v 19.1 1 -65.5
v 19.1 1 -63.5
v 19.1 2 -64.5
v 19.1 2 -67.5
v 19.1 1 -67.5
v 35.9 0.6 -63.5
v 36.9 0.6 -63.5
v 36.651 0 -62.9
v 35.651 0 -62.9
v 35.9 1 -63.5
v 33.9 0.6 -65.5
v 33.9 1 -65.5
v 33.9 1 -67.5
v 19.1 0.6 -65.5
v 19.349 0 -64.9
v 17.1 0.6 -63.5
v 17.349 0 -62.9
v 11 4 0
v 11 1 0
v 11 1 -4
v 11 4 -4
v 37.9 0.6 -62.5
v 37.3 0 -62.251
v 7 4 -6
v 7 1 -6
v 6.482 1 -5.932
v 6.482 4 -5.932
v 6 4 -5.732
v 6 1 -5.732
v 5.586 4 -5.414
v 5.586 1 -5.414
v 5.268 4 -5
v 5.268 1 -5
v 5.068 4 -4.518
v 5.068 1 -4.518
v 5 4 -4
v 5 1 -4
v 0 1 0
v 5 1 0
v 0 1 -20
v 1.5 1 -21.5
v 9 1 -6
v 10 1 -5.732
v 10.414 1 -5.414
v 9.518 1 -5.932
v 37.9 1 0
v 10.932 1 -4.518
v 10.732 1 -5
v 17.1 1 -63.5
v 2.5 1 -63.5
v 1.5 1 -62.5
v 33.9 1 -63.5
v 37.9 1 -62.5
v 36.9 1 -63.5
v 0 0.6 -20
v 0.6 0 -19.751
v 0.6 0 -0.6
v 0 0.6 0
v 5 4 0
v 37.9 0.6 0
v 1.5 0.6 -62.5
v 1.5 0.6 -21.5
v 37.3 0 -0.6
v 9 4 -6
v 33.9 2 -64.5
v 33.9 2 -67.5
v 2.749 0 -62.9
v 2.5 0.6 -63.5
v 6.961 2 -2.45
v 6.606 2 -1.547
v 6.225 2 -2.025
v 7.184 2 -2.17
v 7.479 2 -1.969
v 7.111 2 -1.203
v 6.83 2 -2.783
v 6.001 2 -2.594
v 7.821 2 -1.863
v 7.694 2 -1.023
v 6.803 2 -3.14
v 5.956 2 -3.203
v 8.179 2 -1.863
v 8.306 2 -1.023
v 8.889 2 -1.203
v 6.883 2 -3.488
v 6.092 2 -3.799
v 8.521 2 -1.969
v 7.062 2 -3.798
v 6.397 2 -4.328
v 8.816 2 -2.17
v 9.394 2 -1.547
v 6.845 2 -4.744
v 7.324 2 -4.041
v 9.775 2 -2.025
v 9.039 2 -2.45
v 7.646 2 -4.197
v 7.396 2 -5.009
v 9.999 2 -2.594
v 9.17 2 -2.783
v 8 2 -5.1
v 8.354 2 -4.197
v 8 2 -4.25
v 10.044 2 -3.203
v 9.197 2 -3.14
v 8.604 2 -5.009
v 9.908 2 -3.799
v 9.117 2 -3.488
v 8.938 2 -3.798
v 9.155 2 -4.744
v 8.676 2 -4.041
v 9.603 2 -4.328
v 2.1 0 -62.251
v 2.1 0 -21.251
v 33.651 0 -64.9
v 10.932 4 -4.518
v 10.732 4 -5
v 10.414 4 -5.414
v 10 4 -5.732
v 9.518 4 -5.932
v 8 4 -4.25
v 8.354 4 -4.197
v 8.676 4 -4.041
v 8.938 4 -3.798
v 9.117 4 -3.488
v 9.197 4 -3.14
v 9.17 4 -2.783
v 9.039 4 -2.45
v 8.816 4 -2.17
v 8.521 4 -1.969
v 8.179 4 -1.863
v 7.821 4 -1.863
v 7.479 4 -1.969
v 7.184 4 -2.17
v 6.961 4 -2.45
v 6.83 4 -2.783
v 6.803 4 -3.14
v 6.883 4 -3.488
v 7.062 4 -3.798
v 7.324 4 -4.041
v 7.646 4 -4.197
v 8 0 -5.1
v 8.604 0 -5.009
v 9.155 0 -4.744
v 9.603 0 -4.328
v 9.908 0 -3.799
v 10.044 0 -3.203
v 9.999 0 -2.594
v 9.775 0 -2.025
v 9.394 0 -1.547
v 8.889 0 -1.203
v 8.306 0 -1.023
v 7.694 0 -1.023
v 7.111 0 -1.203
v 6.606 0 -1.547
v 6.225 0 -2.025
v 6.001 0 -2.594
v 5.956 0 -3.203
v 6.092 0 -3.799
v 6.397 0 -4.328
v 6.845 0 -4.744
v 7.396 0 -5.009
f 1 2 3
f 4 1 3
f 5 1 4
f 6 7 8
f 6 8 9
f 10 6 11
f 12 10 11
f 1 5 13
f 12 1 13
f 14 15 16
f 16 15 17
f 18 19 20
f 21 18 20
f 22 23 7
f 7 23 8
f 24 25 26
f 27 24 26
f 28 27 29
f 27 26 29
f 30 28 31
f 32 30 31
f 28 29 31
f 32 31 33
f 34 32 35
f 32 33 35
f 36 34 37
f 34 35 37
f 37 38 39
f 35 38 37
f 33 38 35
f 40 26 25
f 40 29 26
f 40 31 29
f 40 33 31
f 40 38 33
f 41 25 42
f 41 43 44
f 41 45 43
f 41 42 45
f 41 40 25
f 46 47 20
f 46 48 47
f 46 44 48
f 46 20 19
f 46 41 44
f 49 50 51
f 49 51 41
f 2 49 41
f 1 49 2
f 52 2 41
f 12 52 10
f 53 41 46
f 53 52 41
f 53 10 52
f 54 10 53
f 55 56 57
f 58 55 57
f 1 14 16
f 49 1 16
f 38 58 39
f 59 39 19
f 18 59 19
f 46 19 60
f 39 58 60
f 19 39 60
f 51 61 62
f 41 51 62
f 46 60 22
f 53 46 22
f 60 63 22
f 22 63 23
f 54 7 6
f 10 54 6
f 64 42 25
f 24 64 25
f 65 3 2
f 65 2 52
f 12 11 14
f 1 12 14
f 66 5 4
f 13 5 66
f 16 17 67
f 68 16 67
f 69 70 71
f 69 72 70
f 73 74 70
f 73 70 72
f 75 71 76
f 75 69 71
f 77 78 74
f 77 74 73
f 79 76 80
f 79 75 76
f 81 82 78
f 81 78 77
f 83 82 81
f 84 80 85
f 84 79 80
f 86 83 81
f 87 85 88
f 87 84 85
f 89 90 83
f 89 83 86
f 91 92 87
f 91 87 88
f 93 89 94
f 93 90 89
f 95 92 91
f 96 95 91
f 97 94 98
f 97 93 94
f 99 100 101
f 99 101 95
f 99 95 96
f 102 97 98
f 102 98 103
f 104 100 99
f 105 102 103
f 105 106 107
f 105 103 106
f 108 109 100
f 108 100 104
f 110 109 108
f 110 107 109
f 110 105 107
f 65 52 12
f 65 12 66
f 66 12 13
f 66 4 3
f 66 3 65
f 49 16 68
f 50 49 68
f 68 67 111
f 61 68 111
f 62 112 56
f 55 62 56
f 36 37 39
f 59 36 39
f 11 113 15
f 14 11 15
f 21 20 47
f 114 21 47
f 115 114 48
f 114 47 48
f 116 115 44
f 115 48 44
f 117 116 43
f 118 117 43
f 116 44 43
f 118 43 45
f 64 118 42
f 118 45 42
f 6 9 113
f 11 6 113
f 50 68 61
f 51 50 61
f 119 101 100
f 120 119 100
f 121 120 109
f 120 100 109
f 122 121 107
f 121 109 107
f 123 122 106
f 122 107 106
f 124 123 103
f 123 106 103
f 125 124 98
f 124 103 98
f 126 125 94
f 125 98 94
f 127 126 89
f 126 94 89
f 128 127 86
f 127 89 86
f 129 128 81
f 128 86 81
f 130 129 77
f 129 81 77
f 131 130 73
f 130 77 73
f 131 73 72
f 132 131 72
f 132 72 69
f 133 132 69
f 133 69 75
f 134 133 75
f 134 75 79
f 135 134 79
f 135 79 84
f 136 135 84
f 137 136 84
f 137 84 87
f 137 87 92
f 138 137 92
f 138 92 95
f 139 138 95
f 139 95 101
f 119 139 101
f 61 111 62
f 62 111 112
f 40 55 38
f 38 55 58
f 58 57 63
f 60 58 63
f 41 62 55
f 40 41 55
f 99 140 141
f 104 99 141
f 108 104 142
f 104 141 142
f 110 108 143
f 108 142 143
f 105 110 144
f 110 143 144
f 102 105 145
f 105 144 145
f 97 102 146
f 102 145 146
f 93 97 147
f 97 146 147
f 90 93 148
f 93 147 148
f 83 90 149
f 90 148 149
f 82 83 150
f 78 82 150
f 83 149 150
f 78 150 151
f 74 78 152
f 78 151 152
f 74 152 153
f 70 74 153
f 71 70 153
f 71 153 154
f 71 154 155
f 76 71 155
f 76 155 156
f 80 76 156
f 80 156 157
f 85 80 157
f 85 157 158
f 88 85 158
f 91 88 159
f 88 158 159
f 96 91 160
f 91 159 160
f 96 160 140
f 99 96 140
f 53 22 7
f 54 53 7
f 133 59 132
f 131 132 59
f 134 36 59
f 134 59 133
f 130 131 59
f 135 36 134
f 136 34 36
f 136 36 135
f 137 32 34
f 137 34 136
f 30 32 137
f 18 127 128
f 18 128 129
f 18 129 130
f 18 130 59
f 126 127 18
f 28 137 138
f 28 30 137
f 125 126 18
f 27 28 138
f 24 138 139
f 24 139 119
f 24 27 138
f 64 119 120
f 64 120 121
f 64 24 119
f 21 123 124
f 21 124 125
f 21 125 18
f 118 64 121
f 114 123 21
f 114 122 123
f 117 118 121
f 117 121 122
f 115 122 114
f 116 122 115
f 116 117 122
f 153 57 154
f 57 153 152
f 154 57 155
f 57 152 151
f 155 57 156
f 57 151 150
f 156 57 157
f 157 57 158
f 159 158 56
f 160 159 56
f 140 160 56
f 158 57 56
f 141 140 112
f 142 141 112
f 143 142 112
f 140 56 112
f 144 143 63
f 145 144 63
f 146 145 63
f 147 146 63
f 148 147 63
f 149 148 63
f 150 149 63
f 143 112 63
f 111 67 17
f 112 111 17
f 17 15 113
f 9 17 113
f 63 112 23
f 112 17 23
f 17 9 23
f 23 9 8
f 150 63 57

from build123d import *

# Parameters (mm, degrees)
EXTRUDE_1_DEPTH     = 1
CHAMFER_1_SIZE      = 0.6
SKETCH_2_W          = 14.8
SKETCH_2_H          = 4
EXTRUDE_2_DEPTH     = 1
EXTRUDE_3_DEPTH     = 3
SKETCH_4_R          = 1.2
CUT_EXTRUDE_1_DEPTH = 78.515546828
SKETCH_5_R          = 2.05
CUT_EXTRUDE_2_DEPTH = 2
CHAMFER_2_SIZE      = 1


with BuildPart() as part:
    # 草图1 → 凸台-拉伸1 (new body)
    with BuildSketch(Plane(origin=(0, 0, 0), x_dir=(1, 0, 0), z_dir=(0, 1, 0))):
        Polygon((0, 0), (37.9, 0), (37.9, 62.5), (36.9, 63.5), (35.9, 63.5), (33.9, 65.5), (19.1, 65.5), (17.1, 63.5), (2.5, 63.5), (1.5, 62.5), (1.5, 21.5), (0, 20), align=None)
    extrude(amount=EXTRUDE_1_DEPTH)

    # 倒角1
    chamfer_1_edges = [part.edges().sort_by_distance(p)[0] for p in [
        (0.75, 0, -20.75),
        (1.5, 0, -42),
        (2, 0, -63),
        (9.8, 0, -63.5),
        (18.1, 0, -64.5),
        (26.5, 0, -65.5),
        (34.9, 0, -64.5),
        (36.4, 0, -63.5),
        (37.4, 0, -63),
        (37.9, 0, -31.25),
        (18.95, 0, 0),
        (0, 0, -10),
    ]]
    chamfer(chamfer_1_edges, length=CHAMFER_1_SIZE)

    # 草图2 → 凸台-拉伸2 (add)
    with BuildSketch(Plane(origin=(0, 1, 0), x_dir=(1, 0, 0), z_dir=(0, 1, 0))):
        with Locations((26.5, 65.5)):
            Rectangle(SKETCH_2_W, SKETCH_2_H)
    extrude(amount=EXTRUDE_2_DEPTH)

    # 草图3 → 凸台-拉伸3 (add)
    with BuildSketch(Plane(origin=(0, 1, 0), x_dir=(1, 0, 0), z_dir=(0, 1, 0))):
        with BuildLine():
            Line((5, 4), (5, 0))
            Line((5, 0), (11, 0))
            Line((11, 0), (11, 4))
            ThreePointArc((11, 4), (10.414213562, 5.414213562), (9, 6))
            Line((9, 6), (7, 6))
            ThreePointArc((7, 6), (5.585786438, 5.414213562), (5, 4))
        make_face()
    extrude(amount=EXTRUDE_3_DEPTH)

    # 草图4 → 切除-拉伸1 (cut, through all)
    with BuildSketch(Plane.XZ):
        with Locations(Location((8, -3.05, 0), (0, 0, 270))):
            Circle(SKETCH_4_R)
    extrude(amount=-CUT_EXTRUDE_1_DEPTH, mode=Mode.SUBTRACT)

    # 草图5 → 切除-拉伸2 (cut)
    with BuildSketch(Plane.XZ):
        with Locations(Location((8, -3.05, 0), (0, 0, 270))):
            Circle(SKETCH_5_R)
    extrude(amount=-CUT_EXTRUDE_2_DEPTH, mode=Mode.SUBTRACT)

    # 倒角2
    chamfer_2_edges = [part.edges().sort_by_distance(p)[0] for p in [
        (26.5, 2, -63.5),
    ]]
    chamfer(chamfer_2_edges, length=CHAMFER_2_SIZE - 0.0001)  # a hair under: the kernel refuses the full size


solid = part.part
